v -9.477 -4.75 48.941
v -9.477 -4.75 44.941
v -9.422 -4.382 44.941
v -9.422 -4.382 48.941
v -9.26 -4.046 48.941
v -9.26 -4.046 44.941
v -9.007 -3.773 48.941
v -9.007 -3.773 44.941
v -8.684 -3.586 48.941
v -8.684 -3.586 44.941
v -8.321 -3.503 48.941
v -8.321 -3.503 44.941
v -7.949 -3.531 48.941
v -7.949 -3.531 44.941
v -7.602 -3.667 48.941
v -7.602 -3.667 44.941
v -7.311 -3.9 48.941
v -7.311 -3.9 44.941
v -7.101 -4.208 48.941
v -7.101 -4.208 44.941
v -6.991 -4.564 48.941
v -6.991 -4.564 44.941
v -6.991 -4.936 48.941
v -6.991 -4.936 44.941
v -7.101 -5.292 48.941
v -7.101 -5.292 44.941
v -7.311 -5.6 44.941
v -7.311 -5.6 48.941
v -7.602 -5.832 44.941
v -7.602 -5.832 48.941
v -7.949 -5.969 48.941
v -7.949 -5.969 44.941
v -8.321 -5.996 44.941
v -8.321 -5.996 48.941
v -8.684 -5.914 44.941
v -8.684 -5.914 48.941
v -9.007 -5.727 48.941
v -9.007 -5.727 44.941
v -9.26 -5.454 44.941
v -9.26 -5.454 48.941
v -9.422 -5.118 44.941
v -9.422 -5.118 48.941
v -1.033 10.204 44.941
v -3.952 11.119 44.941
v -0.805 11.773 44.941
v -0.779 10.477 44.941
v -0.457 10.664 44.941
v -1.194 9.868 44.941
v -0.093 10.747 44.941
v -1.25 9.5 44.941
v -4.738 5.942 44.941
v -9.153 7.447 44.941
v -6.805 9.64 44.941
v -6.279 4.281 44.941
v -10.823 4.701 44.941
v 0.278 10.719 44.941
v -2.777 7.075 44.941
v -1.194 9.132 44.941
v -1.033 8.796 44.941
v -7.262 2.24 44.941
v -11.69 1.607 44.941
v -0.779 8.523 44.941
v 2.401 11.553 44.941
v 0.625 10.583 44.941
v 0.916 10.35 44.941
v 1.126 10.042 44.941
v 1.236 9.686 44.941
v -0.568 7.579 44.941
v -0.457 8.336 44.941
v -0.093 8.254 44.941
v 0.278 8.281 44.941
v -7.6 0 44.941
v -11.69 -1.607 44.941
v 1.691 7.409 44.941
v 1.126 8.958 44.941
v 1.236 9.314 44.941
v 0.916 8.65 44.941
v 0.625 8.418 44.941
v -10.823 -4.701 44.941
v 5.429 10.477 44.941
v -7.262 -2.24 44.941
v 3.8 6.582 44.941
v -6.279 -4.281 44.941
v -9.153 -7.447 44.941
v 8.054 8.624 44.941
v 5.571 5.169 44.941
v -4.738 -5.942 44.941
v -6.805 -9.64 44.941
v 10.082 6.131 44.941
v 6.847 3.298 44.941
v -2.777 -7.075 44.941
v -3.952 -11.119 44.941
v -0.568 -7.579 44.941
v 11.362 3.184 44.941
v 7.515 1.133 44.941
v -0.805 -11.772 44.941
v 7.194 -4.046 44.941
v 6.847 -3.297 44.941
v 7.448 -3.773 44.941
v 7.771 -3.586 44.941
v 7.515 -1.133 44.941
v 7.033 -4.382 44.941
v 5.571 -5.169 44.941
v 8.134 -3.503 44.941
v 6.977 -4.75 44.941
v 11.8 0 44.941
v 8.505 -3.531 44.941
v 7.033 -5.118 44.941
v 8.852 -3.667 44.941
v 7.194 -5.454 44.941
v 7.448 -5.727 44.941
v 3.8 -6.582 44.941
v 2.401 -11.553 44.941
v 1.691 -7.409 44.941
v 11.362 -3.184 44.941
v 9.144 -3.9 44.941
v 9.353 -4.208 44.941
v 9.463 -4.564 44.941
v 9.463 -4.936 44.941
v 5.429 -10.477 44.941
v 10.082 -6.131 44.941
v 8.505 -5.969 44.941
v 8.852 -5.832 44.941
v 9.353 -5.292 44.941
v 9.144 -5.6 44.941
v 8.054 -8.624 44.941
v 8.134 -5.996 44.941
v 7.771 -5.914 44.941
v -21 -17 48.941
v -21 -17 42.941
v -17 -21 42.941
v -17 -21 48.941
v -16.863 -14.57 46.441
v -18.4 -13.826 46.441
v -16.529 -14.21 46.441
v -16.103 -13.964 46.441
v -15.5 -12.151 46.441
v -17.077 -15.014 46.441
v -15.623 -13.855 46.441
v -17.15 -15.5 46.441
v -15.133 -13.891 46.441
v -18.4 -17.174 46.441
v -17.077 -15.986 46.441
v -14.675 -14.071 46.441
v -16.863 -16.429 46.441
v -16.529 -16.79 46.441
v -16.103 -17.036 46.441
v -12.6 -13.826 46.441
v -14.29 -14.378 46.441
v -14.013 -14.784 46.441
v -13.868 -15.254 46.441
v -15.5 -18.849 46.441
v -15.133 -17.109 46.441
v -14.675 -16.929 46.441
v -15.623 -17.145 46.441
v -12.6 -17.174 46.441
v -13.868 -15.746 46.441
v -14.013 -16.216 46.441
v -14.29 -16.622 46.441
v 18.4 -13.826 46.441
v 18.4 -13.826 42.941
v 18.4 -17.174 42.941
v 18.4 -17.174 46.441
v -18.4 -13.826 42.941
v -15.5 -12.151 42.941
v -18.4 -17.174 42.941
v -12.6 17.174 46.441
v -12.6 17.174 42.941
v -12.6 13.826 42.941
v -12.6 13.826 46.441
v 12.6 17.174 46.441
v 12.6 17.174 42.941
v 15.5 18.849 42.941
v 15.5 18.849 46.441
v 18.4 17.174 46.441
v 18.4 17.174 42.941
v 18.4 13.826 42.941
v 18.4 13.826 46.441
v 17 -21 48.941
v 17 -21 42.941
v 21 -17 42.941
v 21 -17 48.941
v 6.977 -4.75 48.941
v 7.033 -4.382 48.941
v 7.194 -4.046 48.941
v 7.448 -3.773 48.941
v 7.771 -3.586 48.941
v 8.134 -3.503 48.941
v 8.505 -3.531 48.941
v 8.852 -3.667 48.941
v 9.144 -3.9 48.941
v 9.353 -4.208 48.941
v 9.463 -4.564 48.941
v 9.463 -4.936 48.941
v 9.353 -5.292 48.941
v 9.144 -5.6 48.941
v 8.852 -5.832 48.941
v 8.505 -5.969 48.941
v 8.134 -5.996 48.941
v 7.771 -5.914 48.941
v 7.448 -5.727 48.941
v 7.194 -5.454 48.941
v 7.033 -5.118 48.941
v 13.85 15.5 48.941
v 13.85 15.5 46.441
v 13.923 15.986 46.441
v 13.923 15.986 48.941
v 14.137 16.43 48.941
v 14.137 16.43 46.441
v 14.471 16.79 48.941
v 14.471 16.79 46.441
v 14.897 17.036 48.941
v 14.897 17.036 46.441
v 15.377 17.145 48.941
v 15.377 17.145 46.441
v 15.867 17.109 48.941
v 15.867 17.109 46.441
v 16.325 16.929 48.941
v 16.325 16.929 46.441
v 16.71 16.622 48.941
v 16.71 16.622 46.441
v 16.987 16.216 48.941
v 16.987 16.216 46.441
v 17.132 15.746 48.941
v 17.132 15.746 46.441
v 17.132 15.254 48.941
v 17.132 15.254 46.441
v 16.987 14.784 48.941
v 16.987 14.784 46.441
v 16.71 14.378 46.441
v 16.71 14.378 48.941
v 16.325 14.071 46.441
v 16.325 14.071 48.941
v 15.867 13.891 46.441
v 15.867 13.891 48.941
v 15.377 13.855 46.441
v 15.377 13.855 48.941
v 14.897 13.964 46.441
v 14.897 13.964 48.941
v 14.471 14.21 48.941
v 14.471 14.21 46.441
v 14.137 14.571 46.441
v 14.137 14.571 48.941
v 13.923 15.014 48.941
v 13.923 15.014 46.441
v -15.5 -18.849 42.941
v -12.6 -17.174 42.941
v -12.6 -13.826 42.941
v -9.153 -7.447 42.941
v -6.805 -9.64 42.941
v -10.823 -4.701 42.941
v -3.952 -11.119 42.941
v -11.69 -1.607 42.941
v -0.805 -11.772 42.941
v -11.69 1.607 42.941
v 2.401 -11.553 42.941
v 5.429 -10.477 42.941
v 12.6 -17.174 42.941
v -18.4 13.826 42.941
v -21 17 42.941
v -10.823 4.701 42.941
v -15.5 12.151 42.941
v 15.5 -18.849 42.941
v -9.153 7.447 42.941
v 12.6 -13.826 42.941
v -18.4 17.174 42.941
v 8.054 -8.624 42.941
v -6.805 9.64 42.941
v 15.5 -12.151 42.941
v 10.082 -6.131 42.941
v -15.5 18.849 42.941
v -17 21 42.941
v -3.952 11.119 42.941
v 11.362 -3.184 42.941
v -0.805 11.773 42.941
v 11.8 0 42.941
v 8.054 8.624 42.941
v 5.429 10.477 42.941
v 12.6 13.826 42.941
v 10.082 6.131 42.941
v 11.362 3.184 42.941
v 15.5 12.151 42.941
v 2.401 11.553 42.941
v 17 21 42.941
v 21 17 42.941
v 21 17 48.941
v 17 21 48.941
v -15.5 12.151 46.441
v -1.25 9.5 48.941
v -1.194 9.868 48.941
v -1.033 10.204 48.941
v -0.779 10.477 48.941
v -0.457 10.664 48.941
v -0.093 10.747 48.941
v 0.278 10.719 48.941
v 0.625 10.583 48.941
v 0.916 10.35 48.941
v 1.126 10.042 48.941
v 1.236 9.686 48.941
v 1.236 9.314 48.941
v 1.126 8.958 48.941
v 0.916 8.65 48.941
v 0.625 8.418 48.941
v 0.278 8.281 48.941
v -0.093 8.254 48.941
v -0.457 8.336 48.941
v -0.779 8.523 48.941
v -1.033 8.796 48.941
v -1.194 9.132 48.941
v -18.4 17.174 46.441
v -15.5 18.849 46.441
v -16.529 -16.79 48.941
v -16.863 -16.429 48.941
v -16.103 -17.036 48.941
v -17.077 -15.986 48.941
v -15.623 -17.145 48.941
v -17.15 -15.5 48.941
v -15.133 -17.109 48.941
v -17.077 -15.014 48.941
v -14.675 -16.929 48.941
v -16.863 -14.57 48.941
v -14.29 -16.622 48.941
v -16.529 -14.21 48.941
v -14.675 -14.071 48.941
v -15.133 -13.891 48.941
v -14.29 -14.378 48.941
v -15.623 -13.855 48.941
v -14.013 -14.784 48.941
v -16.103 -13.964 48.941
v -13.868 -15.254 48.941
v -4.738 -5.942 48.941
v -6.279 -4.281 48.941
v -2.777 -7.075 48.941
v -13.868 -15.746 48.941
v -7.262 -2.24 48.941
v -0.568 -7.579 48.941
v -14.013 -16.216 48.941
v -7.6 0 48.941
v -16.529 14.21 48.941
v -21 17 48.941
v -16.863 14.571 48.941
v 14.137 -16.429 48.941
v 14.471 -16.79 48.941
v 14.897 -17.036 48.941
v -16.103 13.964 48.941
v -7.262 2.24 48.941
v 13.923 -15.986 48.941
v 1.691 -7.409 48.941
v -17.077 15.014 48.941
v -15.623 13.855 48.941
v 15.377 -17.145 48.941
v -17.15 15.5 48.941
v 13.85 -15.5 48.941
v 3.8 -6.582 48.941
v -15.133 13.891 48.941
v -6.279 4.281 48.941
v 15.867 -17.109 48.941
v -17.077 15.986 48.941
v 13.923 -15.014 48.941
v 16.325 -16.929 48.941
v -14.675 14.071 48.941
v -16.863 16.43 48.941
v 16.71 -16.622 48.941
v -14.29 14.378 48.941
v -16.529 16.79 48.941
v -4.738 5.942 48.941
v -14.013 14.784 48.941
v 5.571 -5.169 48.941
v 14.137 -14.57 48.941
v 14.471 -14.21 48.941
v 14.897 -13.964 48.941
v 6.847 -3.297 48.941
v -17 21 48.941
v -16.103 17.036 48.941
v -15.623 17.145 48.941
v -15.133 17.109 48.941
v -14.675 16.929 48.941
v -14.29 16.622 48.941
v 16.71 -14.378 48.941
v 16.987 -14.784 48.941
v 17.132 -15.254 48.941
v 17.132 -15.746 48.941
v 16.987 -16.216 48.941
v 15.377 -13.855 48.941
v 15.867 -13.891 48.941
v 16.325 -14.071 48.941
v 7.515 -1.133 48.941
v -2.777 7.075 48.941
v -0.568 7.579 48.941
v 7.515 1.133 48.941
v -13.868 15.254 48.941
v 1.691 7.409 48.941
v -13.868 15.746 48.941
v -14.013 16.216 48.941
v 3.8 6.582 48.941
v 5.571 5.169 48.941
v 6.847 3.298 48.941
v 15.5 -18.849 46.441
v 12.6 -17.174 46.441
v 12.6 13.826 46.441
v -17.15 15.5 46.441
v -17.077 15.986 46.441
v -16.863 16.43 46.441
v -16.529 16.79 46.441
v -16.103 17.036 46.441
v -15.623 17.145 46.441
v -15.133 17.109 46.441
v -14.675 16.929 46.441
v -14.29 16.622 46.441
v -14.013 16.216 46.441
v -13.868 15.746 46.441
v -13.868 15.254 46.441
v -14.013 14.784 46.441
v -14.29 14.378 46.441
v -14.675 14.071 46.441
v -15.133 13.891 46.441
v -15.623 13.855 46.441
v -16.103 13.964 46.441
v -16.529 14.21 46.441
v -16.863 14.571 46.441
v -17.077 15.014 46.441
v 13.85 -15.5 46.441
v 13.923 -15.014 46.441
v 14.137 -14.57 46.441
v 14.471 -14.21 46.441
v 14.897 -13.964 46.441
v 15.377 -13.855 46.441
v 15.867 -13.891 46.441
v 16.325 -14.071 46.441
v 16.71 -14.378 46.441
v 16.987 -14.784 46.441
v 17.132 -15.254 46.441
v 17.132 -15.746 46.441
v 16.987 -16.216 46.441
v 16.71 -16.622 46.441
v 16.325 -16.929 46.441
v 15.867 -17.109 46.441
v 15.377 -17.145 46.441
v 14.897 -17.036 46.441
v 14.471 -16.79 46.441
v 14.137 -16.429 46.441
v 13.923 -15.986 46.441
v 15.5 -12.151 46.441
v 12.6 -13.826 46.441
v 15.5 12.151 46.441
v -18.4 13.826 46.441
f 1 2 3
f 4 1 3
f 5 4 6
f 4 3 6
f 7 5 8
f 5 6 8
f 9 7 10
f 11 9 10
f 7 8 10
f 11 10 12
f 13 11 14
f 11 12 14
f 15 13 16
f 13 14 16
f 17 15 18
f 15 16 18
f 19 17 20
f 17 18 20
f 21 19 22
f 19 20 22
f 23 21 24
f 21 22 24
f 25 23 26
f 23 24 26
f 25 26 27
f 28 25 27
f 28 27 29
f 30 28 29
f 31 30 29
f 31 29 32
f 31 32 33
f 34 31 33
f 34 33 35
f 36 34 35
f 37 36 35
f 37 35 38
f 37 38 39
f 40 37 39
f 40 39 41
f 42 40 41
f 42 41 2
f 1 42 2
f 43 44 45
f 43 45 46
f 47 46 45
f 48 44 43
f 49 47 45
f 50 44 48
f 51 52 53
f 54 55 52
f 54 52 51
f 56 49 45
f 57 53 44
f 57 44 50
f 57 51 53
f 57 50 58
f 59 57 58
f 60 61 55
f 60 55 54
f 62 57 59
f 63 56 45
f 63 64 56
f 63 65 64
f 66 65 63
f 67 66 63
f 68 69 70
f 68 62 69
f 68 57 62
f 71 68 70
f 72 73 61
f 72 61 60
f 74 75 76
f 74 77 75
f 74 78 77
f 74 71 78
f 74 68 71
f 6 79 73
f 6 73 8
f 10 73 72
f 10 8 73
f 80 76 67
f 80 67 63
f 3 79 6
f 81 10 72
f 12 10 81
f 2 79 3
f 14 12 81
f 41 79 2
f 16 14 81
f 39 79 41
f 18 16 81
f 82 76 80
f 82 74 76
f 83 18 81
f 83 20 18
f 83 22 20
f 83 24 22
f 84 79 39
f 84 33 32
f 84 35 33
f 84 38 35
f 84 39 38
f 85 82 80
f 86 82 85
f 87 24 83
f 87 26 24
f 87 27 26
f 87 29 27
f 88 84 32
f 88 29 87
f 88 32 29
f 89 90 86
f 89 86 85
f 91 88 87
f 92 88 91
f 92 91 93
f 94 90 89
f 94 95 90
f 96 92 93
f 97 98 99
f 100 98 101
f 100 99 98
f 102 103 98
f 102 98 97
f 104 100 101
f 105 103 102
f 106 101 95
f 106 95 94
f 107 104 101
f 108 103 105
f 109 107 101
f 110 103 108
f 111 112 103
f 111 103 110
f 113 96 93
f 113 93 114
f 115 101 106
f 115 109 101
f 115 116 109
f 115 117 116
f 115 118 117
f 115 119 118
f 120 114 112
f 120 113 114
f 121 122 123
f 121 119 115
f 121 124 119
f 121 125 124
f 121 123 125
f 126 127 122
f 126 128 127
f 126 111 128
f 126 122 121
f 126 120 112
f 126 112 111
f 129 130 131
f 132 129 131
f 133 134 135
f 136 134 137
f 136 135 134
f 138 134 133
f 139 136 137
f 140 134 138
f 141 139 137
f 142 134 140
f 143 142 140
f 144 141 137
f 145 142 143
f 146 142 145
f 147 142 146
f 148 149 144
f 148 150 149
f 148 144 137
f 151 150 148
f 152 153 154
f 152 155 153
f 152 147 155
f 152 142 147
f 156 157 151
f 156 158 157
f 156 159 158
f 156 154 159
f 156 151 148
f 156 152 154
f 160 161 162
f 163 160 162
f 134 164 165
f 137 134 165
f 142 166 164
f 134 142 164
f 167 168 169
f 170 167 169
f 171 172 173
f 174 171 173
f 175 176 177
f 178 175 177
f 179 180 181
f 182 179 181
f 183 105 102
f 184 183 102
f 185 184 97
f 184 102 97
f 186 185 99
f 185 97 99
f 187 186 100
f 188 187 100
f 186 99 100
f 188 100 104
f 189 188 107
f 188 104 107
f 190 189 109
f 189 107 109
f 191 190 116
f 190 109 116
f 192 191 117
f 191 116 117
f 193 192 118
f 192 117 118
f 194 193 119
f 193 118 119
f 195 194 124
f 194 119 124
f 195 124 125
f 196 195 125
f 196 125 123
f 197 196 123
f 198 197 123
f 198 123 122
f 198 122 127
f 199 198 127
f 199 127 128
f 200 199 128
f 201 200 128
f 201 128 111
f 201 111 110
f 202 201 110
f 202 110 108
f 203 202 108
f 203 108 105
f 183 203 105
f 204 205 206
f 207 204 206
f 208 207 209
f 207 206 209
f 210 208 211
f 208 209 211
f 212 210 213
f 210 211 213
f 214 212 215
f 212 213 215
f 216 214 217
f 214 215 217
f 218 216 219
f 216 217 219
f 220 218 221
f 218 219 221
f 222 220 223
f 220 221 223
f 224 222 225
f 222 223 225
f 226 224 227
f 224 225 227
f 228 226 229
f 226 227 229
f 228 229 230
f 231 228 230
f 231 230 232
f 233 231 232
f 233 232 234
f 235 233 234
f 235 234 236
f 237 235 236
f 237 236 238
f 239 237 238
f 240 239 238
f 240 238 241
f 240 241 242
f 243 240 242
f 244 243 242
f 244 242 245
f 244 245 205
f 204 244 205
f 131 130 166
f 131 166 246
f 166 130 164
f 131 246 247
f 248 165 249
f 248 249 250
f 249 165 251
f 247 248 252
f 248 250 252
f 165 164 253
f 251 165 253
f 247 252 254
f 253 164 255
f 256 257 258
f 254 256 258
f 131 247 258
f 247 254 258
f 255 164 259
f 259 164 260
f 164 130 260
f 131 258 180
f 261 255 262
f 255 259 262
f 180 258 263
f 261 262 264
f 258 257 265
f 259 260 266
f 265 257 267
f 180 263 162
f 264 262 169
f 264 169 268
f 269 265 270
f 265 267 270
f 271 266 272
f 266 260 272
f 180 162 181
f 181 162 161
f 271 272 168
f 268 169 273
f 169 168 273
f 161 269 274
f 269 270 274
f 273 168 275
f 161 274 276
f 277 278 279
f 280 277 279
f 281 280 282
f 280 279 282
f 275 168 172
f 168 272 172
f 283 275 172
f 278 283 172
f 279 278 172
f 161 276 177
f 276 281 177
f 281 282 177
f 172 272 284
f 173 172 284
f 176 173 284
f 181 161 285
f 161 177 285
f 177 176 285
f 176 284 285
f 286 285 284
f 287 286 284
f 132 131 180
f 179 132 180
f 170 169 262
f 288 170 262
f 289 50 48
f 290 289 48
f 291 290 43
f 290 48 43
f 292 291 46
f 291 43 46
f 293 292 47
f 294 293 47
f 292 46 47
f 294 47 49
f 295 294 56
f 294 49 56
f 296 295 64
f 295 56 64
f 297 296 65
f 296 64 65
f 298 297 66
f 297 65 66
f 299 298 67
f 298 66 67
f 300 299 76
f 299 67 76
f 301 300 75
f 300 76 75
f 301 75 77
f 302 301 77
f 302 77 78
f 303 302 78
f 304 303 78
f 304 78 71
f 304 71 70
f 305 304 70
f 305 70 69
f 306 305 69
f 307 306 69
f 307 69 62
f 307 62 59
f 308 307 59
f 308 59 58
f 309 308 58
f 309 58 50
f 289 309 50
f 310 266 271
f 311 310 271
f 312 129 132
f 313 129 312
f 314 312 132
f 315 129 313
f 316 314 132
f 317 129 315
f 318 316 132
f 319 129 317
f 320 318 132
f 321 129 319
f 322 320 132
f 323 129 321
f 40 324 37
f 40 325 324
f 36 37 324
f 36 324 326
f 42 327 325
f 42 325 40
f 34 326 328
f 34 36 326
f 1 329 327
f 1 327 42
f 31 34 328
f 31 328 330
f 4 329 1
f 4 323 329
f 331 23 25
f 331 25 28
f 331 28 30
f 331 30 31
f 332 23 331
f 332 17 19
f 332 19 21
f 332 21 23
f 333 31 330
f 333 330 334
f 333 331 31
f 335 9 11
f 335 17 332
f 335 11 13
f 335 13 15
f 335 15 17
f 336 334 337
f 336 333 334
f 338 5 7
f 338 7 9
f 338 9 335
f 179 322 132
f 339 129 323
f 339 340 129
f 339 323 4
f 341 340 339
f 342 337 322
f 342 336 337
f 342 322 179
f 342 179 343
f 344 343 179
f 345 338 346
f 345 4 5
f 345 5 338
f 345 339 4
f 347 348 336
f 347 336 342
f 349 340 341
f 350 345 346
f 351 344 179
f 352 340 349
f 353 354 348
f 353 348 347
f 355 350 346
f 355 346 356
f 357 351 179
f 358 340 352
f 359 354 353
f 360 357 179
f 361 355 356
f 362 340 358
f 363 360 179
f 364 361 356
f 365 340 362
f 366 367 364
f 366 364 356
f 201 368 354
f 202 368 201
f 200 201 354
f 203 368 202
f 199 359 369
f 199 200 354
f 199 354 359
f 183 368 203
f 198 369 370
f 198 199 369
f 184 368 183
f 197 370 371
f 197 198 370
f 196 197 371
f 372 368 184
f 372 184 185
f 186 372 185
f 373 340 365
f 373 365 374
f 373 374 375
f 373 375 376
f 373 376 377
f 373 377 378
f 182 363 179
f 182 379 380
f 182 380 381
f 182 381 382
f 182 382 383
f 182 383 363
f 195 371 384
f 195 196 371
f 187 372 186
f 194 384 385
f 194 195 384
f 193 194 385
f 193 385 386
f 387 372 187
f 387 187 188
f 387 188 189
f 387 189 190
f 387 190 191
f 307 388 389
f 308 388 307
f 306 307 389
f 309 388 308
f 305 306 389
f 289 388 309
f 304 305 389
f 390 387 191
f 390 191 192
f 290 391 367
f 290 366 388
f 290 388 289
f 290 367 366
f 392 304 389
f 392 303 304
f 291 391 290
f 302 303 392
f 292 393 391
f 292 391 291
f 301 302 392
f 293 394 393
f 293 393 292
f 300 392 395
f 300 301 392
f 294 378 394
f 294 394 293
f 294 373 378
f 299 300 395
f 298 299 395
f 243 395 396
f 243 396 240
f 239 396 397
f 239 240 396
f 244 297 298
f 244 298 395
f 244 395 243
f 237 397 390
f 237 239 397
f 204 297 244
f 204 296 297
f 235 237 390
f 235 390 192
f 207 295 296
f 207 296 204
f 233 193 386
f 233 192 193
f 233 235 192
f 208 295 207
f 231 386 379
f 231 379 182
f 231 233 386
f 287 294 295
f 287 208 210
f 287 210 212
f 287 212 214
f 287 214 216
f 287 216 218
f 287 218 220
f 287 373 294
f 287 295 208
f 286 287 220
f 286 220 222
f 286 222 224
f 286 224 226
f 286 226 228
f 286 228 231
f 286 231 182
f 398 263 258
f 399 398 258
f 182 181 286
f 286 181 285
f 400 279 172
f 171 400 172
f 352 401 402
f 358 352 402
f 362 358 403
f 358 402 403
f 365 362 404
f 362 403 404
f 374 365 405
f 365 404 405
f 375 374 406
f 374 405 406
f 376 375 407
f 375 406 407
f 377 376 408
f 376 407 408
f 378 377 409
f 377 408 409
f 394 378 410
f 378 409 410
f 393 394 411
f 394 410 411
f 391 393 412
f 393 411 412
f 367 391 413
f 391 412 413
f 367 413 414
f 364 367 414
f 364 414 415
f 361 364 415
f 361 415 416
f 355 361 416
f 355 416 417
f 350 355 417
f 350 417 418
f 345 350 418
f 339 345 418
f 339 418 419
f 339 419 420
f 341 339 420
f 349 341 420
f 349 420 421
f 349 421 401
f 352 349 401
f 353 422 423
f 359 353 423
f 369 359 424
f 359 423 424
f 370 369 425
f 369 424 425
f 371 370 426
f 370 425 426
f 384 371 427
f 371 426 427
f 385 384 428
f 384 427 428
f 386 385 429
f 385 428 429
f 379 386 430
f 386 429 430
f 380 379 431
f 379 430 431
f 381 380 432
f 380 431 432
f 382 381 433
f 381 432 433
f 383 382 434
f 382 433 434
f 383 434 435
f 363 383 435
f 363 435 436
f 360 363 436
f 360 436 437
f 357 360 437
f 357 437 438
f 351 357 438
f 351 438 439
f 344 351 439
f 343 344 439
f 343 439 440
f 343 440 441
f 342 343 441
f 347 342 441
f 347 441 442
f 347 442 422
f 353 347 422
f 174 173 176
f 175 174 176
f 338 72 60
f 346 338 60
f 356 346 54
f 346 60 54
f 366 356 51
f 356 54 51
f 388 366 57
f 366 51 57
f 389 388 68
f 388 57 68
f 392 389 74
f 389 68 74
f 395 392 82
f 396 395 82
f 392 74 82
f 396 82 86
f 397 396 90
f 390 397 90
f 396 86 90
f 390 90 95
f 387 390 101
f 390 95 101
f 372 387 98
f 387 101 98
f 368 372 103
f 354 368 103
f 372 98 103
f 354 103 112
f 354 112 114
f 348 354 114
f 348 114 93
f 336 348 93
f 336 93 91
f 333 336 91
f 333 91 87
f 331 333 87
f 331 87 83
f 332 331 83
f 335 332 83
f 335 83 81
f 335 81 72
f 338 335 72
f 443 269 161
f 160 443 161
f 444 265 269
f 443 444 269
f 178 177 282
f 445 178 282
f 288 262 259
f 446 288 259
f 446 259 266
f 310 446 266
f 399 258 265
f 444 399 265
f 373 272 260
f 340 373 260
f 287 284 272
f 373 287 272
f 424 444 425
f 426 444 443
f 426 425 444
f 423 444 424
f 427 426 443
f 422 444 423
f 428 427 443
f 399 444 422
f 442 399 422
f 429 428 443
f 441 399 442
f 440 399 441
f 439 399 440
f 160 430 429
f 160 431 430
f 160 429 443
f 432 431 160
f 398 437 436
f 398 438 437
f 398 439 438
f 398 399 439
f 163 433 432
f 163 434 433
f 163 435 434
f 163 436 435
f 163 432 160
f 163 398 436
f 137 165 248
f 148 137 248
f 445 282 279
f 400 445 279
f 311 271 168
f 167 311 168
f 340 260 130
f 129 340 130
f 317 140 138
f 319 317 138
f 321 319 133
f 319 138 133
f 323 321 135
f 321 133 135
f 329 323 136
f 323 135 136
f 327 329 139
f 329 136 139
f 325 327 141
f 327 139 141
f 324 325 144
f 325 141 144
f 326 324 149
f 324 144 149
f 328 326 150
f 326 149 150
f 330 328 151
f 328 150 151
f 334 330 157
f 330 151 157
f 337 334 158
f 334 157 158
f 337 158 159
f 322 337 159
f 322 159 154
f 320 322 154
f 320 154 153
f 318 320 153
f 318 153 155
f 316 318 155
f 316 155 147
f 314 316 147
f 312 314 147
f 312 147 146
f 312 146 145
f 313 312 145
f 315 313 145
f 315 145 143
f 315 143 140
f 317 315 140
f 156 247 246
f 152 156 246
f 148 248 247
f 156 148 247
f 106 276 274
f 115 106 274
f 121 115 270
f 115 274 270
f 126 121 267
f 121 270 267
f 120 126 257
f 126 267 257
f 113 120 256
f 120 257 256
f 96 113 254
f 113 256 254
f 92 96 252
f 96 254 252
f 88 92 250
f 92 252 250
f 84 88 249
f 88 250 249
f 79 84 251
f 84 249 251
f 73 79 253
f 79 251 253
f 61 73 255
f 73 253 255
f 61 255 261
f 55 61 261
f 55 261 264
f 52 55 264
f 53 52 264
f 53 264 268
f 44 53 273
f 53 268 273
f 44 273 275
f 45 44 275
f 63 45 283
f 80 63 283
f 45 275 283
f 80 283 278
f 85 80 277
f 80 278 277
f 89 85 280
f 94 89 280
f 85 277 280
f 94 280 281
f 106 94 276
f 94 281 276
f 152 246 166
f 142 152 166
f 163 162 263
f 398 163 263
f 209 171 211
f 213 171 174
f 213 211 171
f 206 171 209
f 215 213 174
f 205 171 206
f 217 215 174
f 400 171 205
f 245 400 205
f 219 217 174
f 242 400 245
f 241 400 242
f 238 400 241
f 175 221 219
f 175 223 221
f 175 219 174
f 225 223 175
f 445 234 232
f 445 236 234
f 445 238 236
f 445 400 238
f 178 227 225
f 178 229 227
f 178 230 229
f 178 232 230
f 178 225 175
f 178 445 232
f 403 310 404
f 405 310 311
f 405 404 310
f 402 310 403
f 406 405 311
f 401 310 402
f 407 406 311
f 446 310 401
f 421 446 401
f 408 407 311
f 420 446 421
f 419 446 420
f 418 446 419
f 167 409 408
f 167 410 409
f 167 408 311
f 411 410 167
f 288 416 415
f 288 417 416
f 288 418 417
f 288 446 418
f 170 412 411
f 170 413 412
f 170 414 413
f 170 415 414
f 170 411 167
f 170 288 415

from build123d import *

# Parameters (mm, degrees)
SKETCH002_R      = 1.65
SKETCH002_R_2    = 1.25
SKETCH002_R_3    = 7.6
EXTRUDE001_DEPTH = 6
SKETCH003_R      = 11.8
POCKET001_DEPTH  = 2
POCKET002_DEPTH  = 3.5


with BuildPart() as part:
    # Sketch002 → Extrude001 (new body)
    with BuildSketch(Plane(origin=(0, -257.5, 260.94116), x_dir=(-1, 0, 0), z_dir=(0, 0, -1))):
        Polygon((278.411955, 248.765839), (312.411955, 248.765839), (316.411955, 244.765839), (316.411955, 210.765839), (312.411955, 206.765839), (278.411955, 206.765839), (274.411955, 210.765839), (274.411955, 244.765839), align=None)
        with Locations((279.911955, 243.265839)):
            Circle(SKETCH002_R, mode=Mode.SUBTRACT)
        with Locations((310.911955, 243.265839)):
            Circle(SKETCH002_R, mode=Mode.SUBTRACT)
        with Locations((310.911955, 212.265839)):
            Circle(SKETCH002_R, mode=Mode.SUBTRACT)
        with Locations((279.911955, 212.265839)):
            Circle(SKETCH002_R, mode=Mode.SUBTRACT)
        with Locations((295.411955, 237.265839)):
            Circle(SKETCH002_R_2, mode=Mode.SUBTRACT)
        with Locations((303.639196, 223.015839)):
            Circle(SKETCH002_R_2, mode=Mode.SUBTRACT)
        with Locations((287.184713, 223.015839)):
            Circle(SKETCH002_R_2, mode=Mode.SUBTRACT)
        with Locations((295.411955, 227.765839)):
            Circle(SKETCH002_R_3, mode=Mode.SUBTRACT)
    extrude(amount=-EXTRUDE001_DEPTH)


with BuildPart() as part_1:
    # Extrude001 placement: moved
    add(part.part.moved(Location((295.412, 29.7342, -218))))

    # Sketch003 → Pocket001 (cut)
    with BuildSketch(Plane(origin=(295.412, 29.7342, 42.94116), x_dir=(1, 0, 0), z_dir=(0, 0, -1))):
        with Locations((-295.411955, 29.734161)):
            Circle(SKETCH003_R)
    extrude(amount=-POCKET001_DEPTH, mode=Mode.SUBTRACT)

    # Sketch004 → Pocket002 (cut)
    with BuildSketch(Plane(origin=(295.412, 29.7342, 42.94116), x_dir=(1, 0, 0), z_dir=(0, 0, -1))):
        Polygon((-313.811955, 43.559845), (-310.911955, 41.885529), (-308.011955, 43.559845), (-308.011955, 46.908477), (-310.911955, 48.582792), (-313.811955, 46.908477), align=None)
        Polygon((-279.911955, 41.885529), (-277.011955, 43.559845), (-277.011955, 46.908477), (-279.911955, 48.582792), (-282.811955, 46.908477), (-282.811955, 43.559845), align=None)
        Polygon((-279.911955, 17.582792), (-282.811955, 15.908477), (-282.811955, 12.559845), (-279.911955, 10.885529), (-277.011955, 12.559845), (-277.011955, 15.908477), align=None)
        Polygon((-310.911955, 17.582792), (-313.811955, 15.908477), (-313.811955, 12.559845), (-310.911955, 10.885529), (-308.011955, 12.559845), (-308.011955, 15.908477), align=None)
    extrude(amount=-POCKET002_DEPTH, mode=Mode.SUBTRACT)


solid = part_1.part
